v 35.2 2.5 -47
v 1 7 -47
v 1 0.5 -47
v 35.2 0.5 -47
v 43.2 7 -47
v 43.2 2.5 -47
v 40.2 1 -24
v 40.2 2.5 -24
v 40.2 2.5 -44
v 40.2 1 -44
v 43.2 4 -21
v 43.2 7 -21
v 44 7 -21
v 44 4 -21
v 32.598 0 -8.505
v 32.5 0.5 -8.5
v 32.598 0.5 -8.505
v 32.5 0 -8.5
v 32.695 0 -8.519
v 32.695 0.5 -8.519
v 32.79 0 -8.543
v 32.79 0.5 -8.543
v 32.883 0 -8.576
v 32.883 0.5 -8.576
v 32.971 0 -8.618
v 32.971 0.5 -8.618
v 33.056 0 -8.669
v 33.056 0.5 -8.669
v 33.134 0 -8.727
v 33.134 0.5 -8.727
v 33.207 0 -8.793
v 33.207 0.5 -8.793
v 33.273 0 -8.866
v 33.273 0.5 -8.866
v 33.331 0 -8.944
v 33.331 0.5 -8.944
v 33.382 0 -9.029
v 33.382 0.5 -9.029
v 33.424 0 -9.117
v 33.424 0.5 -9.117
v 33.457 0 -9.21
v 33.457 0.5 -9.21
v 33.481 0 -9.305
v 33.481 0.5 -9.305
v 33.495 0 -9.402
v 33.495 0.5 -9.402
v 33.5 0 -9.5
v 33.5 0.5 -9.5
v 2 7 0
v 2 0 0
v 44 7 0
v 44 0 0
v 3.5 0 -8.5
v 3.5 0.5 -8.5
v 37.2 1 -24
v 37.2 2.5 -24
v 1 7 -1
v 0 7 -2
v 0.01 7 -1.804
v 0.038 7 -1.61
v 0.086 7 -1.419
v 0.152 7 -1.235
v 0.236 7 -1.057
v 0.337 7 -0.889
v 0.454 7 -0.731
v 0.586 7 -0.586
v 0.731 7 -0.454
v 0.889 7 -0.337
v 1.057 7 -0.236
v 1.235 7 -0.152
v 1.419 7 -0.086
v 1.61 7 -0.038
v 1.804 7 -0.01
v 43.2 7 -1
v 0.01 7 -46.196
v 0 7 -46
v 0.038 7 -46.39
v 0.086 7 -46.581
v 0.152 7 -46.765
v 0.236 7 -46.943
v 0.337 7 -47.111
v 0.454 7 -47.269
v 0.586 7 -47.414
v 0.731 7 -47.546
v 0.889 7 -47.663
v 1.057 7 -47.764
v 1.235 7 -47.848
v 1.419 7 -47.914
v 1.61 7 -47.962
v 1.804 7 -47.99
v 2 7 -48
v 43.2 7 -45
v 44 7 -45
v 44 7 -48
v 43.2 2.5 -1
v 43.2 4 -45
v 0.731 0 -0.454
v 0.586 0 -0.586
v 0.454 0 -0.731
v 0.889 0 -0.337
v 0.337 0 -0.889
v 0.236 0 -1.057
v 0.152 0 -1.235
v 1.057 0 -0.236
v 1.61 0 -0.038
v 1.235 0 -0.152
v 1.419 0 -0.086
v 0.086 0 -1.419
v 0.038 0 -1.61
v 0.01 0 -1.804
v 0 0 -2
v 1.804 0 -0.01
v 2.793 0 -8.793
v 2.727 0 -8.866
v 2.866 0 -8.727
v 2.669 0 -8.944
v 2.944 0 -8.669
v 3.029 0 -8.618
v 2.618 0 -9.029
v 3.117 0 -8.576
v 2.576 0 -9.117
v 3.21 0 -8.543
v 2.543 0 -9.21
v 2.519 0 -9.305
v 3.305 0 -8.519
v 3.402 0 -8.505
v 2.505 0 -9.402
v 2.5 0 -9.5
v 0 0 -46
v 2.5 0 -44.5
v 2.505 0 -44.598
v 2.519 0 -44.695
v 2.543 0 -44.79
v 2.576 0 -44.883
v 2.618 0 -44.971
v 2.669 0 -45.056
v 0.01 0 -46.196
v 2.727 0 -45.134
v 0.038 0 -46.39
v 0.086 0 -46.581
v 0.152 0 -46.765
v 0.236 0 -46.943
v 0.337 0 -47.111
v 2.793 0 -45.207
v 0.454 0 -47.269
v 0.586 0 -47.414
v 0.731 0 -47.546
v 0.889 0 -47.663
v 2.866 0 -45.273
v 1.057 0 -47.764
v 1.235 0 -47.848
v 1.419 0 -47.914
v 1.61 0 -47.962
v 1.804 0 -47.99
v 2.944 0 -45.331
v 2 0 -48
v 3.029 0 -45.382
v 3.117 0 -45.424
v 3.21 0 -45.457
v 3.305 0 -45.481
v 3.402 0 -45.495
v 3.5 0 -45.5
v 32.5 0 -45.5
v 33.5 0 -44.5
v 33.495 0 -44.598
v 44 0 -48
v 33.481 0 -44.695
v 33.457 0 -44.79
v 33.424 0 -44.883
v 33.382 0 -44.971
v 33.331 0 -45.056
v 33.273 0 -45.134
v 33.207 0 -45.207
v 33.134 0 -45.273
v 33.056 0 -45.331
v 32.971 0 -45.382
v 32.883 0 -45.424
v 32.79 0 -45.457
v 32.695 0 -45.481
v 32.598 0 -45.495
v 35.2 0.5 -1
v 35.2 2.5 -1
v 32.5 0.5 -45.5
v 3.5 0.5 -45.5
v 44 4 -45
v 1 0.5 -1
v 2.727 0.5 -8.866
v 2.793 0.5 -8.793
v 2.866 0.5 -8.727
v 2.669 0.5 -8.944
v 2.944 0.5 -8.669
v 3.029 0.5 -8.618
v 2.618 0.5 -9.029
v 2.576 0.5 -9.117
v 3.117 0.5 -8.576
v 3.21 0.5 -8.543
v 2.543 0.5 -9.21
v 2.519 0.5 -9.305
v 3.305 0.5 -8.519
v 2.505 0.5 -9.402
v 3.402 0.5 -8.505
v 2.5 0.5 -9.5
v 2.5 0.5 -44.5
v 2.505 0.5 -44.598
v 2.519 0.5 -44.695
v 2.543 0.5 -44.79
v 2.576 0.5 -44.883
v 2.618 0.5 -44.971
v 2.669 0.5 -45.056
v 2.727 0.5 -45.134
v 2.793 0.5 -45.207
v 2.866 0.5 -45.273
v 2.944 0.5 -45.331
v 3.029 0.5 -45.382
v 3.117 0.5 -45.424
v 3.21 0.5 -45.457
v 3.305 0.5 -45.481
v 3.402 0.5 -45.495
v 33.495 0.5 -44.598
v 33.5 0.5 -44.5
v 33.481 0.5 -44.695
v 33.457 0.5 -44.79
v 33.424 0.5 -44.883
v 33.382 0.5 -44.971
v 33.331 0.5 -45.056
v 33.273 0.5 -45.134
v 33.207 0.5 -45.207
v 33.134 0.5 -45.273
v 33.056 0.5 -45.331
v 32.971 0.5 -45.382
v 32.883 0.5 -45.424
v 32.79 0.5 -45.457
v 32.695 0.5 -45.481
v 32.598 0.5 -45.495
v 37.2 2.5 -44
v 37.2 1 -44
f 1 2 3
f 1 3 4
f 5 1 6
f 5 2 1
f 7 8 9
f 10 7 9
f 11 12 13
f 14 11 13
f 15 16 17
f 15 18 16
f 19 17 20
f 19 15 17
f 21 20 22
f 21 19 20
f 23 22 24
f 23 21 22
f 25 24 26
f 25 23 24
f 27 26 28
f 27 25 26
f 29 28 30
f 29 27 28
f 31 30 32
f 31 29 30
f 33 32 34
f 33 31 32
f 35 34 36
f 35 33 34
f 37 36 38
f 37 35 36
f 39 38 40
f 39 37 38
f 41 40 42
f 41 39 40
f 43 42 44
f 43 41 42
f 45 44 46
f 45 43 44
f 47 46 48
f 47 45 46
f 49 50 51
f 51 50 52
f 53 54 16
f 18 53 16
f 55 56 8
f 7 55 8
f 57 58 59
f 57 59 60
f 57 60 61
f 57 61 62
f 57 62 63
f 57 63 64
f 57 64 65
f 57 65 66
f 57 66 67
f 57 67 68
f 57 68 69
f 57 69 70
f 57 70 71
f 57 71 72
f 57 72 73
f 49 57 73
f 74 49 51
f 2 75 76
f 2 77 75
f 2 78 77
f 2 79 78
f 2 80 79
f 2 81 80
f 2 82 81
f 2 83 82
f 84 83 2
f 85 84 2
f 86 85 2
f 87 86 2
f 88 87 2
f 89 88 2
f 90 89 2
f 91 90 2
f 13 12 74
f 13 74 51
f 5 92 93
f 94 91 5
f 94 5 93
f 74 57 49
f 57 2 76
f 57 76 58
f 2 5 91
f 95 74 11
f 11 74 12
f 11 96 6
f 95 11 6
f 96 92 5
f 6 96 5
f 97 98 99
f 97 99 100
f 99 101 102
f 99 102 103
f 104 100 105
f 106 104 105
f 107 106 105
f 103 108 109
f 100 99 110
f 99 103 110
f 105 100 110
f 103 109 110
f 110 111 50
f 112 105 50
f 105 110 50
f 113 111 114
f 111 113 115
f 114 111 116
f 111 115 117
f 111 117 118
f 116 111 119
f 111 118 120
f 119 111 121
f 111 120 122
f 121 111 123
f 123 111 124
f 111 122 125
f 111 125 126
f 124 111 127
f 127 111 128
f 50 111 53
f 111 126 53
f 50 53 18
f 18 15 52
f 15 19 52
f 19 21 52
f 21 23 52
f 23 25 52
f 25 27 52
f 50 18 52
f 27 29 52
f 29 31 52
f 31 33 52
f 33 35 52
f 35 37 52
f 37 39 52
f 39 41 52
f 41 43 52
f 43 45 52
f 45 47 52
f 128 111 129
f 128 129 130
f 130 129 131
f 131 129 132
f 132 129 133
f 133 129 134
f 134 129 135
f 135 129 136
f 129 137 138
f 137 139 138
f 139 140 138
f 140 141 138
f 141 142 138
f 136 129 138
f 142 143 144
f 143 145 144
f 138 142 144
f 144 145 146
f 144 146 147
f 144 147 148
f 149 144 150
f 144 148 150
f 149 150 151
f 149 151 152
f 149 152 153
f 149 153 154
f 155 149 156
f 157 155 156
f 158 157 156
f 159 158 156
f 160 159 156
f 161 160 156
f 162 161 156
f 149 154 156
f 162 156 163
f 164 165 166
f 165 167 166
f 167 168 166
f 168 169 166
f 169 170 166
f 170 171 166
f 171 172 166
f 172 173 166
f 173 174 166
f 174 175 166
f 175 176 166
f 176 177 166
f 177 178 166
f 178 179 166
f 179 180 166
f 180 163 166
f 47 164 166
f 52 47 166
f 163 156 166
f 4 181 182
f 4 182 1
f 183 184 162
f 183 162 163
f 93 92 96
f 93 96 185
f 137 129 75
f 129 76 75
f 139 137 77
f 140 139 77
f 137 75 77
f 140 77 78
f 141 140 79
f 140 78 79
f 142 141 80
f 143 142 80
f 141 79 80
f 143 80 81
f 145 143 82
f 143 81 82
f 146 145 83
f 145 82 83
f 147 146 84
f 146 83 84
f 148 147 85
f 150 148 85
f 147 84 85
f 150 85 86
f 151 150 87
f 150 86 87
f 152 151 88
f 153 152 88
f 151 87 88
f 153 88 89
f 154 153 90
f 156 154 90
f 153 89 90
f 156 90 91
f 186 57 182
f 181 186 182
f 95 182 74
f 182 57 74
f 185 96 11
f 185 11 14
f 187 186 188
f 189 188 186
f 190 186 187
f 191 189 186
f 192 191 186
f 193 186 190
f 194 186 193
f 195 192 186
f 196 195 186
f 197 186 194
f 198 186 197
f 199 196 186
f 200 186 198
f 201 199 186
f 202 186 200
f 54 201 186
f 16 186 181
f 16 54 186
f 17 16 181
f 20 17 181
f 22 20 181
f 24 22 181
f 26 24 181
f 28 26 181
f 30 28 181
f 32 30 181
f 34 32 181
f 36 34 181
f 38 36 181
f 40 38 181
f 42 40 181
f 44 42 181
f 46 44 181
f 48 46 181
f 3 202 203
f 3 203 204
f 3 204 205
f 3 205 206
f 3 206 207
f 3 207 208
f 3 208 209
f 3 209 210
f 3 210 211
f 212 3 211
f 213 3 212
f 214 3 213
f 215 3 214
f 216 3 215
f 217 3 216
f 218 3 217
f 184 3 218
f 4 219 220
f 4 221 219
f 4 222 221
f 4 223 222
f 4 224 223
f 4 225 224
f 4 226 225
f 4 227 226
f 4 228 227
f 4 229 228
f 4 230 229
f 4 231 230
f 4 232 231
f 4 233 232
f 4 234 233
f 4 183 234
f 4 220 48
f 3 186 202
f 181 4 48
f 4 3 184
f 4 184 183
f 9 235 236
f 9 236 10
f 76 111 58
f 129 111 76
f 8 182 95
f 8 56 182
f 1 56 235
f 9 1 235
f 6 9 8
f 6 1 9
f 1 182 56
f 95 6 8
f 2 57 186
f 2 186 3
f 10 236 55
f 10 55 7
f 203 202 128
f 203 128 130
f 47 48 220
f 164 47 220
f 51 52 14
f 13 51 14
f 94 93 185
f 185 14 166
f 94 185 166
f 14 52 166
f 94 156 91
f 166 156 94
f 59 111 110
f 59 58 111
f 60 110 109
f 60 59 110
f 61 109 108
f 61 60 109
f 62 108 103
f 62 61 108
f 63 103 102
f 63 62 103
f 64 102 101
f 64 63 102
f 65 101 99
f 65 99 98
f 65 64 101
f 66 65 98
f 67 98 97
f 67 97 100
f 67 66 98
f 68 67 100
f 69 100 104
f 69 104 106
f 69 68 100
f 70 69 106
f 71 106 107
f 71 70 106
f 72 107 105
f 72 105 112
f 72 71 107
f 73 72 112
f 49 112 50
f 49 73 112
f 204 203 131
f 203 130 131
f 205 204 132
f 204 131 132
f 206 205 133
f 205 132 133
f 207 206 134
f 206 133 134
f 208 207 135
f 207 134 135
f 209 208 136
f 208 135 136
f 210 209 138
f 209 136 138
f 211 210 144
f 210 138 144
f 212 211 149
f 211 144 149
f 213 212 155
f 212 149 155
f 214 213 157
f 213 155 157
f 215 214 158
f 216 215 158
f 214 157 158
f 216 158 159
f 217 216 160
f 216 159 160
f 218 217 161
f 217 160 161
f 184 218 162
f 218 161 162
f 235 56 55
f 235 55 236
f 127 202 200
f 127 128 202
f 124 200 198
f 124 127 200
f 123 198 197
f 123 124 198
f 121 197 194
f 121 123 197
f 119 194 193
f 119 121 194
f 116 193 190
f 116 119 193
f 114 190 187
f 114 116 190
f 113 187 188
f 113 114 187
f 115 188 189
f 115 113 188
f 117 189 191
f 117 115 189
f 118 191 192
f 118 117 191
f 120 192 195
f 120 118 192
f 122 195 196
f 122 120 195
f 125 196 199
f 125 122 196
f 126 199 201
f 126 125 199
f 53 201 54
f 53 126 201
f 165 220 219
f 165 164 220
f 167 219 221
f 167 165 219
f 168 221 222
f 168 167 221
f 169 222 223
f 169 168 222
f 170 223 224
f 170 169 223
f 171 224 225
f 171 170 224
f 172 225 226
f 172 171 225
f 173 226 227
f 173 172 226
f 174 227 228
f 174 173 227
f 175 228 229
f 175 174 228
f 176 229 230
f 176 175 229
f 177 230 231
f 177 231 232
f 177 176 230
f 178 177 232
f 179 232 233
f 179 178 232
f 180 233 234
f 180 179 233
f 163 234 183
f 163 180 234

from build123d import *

# Parameters (mm, degrees)
SKETCH1_W           = 44
SKETCH1_H           = 48
BOSS_EXTRUDE1_DEPTH = 7
SKETCH2_W           = 42.2
SKETCH2_H           = 46
CUT_EXTRUDE1_DEPTH  = 6.5
CUT_EXTRUDE2_REACH  = 67.439
SKETCH3_W           = 31
SKETCH3_H           = 37
SKETCH4_W           = 8
SKETCH4_H           = 46
BOSS_EXTRUDE2_DEPTH = 2
SKETCH5_W           = 0.8
SKETCH5_H           = 24
CUT_EXTRUDE3_DEPTH  = 3
FILLET1_R           = 2
FILLET2_R           = 1
SKETCH6_W           = 3
SKETCH6_H           = 20
CUT_EXTRUDE4_DEPTH  = 1.5


with BuildPart() as part:
    # Sketch1 → Boss-Extrude1 (new body)
    with BuildSketch(Plane(origin=(0, 0, 0), x_dir=(1, 0, 0), z_dir=(0, 1, 0))):
        with Locations((22, 24)):
            Rectangle(SKETCH1_W, SKETCH1_H)
    extrude(amount=BOSS_EXTRUDE1_DEPTH)

    # Sketch2 → Cut-Extrude1 (cut)
    with BuildSketch(Plane(origin=(0, 7, 0), x_dir=(1, 0, 0), z_dir=(0, 1, 0))):
        with Locations((22.1, 24)):
            Rectangle(SKETCH2_W, SKETCH2_H)
    extrude(amount=-CUT_EXTRUDE1_DEPTH, mode=Mode.SUBTRACT)

    # Sketch3 → Cut-Extrude2 (cut, up to next)
    with BuildSketch(Plane(origin=(0, 0.5, 0), x_dir=(1, 0, 0), z_dir=(0, 1, 0)), mode=Mode.PRIVATE) as cut_extrude2_sk1:
        with Locations((18, 27)):
            Rectangle(SKETCH3_W, SKETCH3_H)
    cut_extrude2_tool1 = extrude(cut_extrude2_sk1.sketch, amount=-CUT_EXTRUDE2_REACH, mode=Mode.PRIVATE) & part.part
    add(cut_extrude2_tool1.solids().sort_by_distance((18, 0.5, -27))[0], mode=Mode.SUBTRACT)

    # Sketch4 → Boss-Extrude2 (add)
    with BuildSketch(Plane(origin=(0, 0.5, 0), x_dir=(1, 0, 0), z_dir=(0, 1, 0))):
        with Locations((39.2, 24)):
            Rectangle(SKETCH4_W, SKETCH4_H)
    extrude(amount=BOSS_EXTRUDE2_DEPTH)

    # Sketch5 → Cut-Extrude3 (cut)
    with BuildSketch(Plane(origin=(0, 7, 0), x_dir=(1, 0, 0), z_dir=(0, 1, 0))):
        with Locations((43.6, 33)):
            Rectangle(SKETCH5_W, SKETCH5_H)
    extrude(amount=-CUT_EXTRUDE3_DEPTH, mode=Mode.SUBTRACT)

    # Fillet1
    fillet1_edges = [part.edges().sort_by_distance(p)[0] for p in [
        (0, 3.5, -48),
        (0, 3.5, 0),
    ]]
    fillet(fillet1_edges, radius=FILLET1_R)

    # Fillet2
    fillet2_edges = [part.edges().sort_by_distance(p)[0] for p in [
        (2.5, 0.25, -8.5),
        (2.5, 0.25, -45.5),
        (33.5, 0.25, -45.5),
        (33.5, 0.25, -8.5),
    ]]
    fillet(fillet2_edges, radius=FILLET2_R)

    # Sketch6 → Cut-Extrude4 (cut)
    with BuildSketch(Plane(origin=(0, 2.5, 0), x_dir=(1, 0, 0), z_dir=(0, 1, 0))):
        with Locations((38.7, 34)):
            Rectangle(SKETCH6_W, SKETCH6_H)
    extrude(amount=-CUT_EXTRUDE4_DEPTH, mode=Mode.SUBTRACT)


solid = part.part
